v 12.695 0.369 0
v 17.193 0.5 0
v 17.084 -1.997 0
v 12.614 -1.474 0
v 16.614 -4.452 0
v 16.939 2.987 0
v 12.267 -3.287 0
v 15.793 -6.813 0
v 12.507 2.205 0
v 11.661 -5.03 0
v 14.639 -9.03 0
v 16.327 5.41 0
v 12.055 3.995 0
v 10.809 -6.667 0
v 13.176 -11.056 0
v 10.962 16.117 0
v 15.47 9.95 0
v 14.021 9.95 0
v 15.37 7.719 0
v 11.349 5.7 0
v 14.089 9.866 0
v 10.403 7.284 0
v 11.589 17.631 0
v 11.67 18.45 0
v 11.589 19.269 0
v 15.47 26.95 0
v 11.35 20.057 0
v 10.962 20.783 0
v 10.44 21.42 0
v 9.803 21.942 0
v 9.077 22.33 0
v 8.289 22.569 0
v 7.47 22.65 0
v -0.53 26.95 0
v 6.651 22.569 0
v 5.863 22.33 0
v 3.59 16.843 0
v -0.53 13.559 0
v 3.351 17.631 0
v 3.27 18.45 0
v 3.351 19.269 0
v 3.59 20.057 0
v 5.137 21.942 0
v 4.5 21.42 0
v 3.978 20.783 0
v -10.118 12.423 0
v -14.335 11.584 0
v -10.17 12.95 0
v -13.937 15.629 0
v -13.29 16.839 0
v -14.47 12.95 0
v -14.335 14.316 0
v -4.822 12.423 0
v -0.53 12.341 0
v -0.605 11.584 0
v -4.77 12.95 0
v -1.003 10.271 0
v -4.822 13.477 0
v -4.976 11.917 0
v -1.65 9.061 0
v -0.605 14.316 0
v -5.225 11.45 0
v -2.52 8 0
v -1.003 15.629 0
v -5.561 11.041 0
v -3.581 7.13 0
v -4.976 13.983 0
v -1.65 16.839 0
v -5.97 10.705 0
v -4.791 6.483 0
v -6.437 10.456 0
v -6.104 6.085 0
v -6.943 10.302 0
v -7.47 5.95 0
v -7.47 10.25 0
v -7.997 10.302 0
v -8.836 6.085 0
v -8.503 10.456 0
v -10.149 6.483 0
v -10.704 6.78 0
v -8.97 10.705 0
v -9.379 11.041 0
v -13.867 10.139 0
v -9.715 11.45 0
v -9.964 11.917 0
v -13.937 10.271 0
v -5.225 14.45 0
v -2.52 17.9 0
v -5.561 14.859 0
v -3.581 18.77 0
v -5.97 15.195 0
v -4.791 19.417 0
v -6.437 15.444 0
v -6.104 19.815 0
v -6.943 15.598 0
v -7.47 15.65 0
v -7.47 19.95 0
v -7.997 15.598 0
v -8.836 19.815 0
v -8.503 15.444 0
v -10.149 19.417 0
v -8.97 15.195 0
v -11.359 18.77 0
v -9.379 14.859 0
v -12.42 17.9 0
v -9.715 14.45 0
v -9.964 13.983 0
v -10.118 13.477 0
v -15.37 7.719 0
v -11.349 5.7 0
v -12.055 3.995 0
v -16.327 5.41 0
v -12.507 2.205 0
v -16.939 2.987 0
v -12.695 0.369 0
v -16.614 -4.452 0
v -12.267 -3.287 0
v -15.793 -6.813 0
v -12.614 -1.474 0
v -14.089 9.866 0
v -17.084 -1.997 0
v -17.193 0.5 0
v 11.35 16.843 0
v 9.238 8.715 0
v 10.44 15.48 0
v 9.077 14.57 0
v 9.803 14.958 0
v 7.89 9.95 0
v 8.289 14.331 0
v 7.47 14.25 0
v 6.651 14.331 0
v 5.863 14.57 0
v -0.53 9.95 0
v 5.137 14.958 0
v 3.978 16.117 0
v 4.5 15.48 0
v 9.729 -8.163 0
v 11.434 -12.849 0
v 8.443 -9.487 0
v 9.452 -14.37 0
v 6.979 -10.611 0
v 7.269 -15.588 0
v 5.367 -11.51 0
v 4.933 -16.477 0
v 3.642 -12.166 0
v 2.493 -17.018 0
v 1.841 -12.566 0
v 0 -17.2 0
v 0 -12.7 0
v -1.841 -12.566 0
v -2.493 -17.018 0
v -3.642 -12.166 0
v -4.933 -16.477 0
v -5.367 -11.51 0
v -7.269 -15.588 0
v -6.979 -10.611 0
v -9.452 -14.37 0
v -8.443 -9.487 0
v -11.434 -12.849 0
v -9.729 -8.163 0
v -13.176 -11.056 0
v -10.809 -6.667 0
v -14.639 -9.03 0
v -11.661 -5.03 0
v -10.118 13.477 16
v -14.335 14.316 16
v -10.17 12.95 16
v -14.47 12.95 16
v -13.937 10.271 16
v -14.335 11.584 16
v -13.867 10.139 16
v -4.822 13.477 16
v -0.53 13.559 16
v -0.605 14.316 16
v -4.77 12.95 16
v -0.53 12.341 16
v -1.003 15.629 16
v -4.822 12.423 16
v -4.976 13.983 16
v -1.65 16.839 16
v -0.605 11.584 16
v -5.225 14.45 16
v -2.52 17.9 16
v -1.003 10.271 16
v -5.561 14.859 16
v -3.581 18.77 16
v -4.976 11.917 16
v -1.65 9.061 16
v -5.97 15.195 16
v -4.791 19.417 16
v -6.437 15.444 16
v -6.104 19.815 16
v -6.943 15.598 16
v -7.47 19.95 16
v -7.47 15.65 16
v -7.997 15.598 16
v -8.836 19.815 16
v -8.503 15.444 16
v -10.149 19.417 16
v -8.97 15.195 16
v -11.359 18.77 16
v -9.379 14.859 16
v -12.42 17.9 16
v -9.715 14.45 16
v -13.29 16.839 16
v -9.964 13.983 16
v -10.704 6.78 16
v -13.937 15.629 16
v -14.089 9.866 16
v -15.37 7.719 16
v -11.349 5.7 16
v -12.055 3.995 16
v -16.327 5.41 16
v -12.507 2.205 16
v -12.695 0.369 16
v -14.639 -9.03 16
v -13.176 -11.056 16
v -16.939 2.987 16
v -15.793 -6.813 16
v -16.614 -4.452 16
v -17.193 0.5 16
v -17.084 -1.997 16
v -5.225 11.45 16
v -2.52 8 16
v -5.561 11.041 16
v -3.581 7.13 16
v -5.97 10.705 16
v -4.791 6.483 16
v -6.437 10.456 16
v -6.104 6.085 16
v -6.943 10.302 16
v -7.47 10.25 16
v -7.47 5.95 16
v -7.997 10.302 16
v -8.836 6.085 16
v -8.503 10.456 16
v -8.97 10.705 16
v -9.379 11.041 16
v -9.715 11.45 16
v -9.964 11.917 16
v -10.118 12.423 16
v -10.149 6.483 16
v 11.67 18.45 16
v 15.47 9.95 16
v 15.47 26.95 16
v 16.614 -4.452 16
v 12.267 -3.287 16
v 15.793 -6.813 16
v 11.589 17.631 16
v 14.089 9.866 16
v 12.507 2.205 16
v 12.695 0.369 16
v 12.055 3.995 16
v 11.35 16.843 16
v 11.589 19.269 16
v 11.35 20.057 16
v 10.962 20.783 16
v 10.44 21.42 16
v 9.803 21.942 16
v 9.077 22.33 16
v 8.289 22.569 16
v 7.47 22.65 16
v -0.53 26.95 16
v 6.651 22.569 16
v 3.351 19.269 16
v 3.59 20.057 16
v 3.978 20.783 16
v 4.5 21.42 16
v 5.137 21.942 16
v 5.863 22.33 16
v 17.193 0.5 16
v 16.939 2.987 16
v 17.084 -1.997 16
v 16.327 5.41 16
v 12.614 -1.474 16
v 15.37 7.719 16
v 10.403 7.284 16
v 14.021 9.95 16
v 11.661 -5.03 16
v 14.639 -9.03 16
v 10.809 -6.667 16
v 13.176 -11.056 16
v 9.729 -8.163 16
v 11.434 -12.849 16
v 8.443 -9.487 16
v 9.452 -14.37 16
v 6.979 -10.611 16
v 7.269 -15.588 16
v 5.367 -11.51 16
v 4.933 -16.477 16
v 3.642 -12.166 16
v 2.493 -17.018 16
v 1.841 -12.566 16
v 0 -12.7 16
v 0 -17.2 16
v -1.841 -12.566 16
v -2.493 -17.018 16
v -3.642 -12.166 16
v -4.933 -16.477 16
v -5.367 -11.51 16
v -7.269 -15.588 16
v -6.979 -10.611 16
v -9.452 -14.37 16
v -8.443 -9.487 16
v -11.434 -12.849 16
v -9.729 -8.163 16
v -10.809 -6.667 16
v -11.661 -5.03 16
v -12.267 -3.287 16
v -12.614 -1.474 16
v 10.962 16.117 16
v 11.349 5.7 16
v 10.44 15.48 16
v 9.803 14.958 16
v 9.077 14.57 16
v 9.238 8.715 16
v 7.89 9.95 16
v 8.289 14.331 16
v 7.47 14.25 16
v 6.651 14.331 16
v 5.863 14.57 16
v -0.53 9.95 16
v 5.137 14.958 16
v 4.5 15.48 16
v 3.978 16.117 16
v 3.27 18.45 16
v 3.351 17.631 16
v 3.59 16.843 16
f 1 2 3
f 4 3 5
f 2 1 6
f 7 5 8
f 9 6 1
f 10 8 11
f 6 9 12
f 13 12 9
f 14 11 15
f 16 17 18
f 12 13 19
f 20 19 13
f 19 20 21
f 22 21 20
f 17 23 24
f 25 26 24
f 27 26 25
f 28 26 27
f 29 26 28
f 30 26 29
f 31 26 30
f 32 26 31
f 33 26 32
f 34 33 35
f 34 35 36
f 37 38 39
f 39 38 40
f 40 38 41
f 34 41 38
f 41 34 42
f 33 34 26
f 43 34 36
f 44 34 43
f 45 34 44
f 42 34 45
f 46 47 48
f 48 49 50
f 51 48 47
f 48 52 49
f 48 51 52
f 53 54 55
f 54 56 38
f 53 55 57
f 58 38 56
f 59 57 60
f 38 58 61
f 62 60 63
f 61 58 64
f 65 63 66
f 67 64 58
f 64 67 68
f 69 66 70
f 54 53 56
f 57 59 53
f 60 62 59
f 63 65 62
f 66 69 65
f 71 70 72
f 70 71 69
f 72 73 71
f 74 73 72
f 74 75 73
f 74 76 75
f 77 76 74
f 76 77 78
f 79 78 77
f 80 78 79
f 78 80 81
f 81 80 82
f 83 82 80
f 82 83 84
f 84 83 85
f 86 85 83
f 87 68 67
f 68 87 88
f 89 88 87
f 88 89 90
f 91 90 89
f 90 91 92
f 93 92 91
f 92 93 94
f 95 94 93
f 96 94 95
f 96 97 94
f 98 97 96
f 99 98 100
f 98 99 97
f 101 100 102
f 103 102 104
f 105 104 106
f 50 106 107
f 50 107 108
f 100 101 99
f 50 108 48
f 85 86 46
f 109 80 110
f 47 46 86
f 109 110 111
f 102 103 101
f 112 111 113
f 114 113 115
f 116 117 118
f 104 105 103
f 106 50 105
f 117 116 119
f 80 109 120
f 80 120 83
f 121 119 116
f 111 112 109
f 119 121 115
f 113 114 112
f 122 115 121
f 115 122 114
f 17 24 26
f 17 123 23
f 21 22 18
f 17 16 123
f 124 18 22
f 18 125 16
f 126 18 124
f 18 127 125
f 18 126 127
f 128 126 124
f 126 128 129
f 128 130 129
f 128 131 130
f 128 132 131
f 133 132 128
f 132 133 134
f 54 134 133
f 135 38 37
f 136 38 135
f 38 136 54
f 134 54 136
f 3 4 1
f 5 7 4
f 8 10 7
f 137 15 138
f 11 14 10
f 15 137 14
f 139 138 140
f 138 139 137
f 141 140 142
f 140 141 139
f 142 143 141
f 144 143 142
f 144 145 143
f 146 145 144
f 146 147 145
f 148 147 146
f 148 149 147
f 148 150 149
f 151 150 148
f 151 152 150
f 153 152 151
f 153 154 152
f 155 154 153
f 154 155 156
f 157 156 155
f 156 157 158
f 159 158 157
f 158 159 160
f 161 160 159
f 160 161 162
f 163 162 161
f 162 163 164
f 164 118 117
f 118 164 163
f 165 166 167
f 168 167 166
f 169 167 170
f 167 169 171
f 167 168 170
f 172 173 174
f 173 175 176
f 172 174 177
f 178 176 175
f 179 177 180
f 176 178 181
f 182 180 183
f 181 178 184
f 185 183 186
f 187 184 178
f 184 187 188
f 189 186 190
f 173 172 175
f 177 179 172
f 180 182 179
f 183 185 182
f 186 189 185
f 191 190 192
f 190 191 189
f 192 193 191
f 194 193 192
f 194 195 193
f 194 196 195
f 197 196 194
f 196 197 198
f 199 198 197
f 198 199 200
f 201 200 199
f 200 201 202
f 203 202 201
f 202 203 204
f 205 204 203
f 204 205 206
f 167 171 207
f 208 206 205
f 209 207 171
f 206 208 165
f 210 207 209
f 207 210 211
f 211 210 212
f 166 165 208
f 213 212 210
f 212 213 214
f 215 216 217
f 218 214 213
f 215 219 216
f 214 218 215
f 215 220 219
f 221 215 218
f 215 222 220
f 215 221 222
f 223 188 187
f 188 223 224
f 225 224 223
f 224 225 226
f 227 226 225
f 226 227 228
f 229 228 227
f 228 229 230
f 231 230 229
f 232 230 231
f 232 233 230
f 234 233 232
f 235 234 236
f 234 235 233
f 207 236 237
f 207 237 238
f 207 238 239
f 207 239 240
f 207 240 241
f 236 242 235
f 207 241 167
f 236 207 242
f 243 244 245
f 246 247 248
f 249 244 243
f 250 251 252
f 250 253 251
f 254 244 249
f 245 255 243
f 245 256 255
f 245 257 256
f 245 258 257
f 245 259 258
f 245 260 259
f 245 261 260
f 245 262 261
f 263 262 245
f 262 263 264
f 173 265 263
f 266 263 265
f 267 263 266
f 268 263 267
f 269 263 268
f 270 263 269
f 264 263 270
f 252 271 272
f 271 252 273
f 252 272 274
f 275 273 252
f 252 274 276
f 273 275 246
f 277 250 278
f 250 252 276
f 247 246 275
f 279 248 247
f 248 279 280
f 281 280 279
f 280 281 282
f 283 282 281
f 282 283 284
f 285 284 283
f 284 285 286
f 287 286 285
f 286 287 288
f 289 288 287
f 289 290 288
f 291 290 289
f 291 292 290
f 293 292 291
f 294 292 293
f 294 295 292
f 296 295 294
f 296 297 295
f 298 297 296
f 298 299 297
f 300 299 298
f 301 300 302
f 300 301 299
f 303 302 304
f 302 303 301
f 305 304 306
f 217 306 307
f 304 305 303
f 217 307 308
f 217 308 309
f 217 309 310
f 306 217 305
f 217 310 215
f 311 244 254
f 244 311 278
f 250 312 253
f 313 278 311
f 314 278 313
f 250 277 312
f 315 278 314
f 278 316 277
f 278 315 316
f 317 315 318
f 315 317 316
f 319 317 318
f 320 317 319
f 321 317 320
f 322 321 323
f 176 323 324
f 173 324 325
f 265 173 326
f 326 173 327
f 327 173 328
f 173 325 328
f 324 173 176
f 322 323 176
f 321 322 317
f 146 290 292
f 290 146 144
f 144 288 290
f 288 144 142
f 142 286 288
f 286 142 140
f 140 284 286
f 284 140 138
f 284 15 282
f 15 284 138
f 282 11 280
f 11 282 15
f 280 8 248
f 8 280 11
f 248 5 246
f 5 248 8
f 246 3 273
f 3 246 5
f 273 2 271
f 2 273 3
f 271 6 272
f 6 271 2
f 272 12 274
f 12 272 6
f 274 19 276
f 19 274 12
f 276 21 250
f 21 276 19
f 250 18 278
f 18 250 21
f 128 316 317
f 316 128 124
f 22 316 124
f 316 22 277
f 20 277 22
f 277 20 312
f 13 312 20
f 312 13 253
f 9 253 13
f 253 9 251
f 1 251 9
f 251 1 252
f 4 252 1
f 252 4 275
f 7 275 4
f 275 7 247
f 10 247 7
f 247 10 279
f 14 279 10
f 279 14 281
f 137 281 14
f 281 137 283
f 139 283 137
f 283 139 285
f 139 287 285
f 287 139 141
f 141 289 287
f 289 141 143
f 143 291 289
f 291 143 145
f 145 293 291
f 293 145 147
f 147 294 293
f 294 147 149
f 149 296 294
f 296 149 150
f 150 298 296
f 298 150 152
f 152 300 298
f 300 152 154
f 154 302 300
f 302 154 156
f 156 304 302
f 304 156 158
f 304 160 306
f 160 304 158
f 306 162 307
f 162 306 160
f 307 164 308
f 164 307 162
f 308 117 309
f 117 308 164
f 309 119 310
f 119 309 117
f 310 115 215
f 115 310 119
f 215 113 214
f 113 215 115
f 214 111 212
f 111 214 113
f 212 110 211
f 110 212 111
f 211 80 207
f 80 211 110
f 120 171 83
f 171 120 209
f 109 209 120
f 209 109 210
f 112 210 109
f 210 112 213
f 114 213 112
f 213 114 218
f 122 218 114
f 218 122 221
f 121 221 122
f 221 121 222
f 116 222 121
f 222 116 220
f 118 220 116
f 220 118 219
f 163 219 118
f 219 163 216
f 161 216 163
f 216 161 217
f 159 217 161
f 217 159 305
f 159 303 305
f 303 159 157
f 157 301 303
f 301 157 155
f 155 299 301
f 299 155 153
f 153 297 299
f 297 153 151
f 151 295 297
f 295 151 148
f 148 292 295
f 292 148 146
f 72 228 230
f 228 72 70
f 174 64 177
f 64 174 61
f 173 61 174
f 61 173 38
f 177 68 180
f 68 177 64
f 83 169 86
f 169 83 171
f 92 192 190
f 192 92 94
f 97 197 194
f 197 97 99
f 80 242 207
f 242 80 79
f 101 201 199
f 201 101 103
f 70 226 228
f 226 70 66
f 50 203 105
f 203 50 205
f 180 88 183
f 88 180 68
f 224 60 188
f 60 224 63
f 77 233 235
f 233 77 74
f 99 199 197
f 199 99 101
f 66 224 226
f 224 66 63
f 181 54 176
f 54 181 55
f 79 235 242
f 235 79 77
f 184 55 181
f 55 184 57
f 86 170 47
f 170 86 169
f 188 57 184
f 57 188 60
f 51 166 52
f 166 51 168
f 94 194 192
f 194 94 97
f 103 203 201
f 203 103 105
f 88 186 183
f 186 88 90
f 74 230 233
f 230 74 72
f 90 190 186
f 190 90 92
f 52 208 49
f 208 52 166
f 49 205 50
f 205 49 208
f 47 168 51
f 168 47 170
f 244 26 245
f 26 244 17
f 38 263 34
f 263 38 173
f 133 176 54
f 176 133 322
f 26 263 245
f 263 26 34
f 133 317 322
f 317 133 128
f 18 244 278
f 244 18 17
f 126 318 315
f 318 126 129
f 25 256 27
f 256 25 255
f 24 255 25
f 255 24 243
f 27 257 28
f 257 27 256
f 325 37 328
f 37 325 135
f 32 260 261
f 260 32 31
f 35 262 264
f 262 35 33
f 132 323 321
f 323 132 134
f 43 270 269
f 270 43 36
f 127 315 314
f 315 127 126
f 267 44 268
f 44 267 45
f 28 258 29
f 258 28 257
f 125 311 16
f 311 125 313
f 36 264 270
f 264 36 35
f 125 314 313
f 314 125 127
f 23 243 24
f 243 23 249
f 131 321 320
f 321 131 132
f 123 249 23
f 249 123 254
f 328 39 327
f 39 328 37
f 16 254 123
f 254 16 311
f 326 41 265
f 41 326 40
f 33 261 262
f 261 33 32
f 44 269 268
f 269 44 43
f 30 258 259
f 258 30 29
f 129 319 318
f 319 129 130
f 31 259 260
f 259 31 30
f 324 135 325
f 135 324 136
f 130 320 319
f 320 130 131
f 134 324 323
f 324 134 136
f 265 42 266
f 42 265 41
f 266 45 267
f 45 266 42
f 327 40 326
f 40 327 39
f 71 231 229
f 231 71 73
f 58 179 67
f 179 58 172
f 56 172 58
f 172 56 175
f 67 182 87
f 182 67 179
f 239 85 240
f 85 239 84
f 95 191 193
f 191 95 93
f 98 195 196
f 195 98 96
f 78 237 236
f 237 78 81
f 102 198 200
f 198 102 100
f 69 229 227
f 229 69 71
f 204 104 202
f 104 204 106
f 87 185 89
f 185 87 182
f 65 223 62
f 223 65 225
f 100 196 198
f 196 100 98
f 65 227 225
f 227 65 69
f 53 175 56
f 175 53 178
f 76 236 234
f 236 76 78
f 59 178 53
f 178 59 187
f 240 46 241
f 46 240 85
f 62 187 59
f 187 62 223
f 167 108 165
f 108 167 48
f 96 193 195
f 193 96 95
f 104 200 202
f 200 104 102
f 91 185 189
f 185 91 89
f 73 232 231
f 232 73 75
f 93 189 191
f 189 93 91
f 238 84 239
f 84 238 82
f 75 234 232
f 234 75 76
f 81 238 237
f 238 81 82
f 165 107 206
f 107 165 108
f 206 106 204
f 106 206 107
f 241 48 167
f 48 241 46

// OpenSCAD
$fn = 32;

// ----------------------------------------------------------------------
// Pipe clamp: 34.4 mm ring, 4.5 mm wall, 16 mm wide
// ----------------------------------------------------------------------

// --- parameters (mm) ---
outer_r = 17.2;           // clamp outside radius
inner_r = 12.7;           // pipe bore radius
band = 4.5;               // band thickness
clamp_w = 16;             // clamp width
opening = 60;             // opening angle between the ends
lug_w = 16;               // lug width
lug_len = 17;             // lug length
bolt_d = 8.4;             // bolt hole
knuckle_d = 14;           // hinge knuckle diameter
pin_d = 5.4;              // hinge pin hole

clamp_profile = [[-8.6, 14.896], [-10.668, 13.492], [-12.511, 11.803], [-14.089, 9.866], [-15.37, 7.719], [-16.327, 5.41], [-16.939, 2.987], [-17.193, 0.5], [-17.084, -1.997], [-16.614, -4.452], [-15.793, -6.813], [-14.639, -9.03], [-13.176, -11.056], [-11.434, -12.849], [-9.452, -14.37], [-7.269, -15.588], [-4.933, -16.477], [-2.493, -17.018], [0, -17.2], [2.493, -17.018], [4.933, -16.477], [7.269, -15.588], [9.452, -14.37], [11.434, -12.849], [13.176, -11.056], [14.639, -9.03], [15.793, -6.813], [16.614, -4.452], [17.084, -1.997], [17.193, 0.5], [16.939, 2.987], [16.327, 5.41], [15.37, 7.719], [14.089, 9.866], [12.511, 11.803], [10.668, 13.492], [8.6, 14.896], [6.35, 10.999], [7.877, 9.962], [9.238, 8.715], [10.403, 7.284], [11.349, 5.7], [12.055, 3.995], [12.507, 2.205], [12.695, 0.369], [12.614, -1.474], [12.267, -3.287], [11.661, -5.03], [10.809, -6.667], [9.729, -8.163], [8.443, -9.487], [6.979, -10.611], [5.367, -11.51], [3.642, -12.166], [1.841, -12.566], [0, -12.7], [-1.841, -12.566], [-3.642, -12.166], [-5.367, -11.51], [-6.979, -10.611], [-8.443, -9.487], [-9.729, -8.163], [-10.809, -6.667], [-11.661, -5.03], [-12.267, -3.287], [-12.614, -1.474], [-12.695, 0.369], [-12.507, 2.205], [-12.055, 3.995], [-11.349, 5.7], [-10.403, 7.284], [-9.238, 8.715], [-7.877, 9.962], [-6.35, 10.999]];

difference() {
  union() {
    linear_extrude(height = clamp_w) polygon(clamp_profile);
    /* hinge knuckle, sunk 2 mm into the band end */
    translate([-7.47, 12.95, 0]) cylinder(h = clamp_w, d = knuckle_d);
    /* bolt lug on the other end */
    translate([-0.53, 9.95, 0]) cube([lug_w, 17, clamp_w]);
  }
  translate([7.47, 18.45, -2.5]) cylinder(h = clamp_w + 5, d = bolt_d);
  translate([-7.47, 12.95, -2.5]) cylinder(h = clamp_w + 5, d = pin_d);
}
